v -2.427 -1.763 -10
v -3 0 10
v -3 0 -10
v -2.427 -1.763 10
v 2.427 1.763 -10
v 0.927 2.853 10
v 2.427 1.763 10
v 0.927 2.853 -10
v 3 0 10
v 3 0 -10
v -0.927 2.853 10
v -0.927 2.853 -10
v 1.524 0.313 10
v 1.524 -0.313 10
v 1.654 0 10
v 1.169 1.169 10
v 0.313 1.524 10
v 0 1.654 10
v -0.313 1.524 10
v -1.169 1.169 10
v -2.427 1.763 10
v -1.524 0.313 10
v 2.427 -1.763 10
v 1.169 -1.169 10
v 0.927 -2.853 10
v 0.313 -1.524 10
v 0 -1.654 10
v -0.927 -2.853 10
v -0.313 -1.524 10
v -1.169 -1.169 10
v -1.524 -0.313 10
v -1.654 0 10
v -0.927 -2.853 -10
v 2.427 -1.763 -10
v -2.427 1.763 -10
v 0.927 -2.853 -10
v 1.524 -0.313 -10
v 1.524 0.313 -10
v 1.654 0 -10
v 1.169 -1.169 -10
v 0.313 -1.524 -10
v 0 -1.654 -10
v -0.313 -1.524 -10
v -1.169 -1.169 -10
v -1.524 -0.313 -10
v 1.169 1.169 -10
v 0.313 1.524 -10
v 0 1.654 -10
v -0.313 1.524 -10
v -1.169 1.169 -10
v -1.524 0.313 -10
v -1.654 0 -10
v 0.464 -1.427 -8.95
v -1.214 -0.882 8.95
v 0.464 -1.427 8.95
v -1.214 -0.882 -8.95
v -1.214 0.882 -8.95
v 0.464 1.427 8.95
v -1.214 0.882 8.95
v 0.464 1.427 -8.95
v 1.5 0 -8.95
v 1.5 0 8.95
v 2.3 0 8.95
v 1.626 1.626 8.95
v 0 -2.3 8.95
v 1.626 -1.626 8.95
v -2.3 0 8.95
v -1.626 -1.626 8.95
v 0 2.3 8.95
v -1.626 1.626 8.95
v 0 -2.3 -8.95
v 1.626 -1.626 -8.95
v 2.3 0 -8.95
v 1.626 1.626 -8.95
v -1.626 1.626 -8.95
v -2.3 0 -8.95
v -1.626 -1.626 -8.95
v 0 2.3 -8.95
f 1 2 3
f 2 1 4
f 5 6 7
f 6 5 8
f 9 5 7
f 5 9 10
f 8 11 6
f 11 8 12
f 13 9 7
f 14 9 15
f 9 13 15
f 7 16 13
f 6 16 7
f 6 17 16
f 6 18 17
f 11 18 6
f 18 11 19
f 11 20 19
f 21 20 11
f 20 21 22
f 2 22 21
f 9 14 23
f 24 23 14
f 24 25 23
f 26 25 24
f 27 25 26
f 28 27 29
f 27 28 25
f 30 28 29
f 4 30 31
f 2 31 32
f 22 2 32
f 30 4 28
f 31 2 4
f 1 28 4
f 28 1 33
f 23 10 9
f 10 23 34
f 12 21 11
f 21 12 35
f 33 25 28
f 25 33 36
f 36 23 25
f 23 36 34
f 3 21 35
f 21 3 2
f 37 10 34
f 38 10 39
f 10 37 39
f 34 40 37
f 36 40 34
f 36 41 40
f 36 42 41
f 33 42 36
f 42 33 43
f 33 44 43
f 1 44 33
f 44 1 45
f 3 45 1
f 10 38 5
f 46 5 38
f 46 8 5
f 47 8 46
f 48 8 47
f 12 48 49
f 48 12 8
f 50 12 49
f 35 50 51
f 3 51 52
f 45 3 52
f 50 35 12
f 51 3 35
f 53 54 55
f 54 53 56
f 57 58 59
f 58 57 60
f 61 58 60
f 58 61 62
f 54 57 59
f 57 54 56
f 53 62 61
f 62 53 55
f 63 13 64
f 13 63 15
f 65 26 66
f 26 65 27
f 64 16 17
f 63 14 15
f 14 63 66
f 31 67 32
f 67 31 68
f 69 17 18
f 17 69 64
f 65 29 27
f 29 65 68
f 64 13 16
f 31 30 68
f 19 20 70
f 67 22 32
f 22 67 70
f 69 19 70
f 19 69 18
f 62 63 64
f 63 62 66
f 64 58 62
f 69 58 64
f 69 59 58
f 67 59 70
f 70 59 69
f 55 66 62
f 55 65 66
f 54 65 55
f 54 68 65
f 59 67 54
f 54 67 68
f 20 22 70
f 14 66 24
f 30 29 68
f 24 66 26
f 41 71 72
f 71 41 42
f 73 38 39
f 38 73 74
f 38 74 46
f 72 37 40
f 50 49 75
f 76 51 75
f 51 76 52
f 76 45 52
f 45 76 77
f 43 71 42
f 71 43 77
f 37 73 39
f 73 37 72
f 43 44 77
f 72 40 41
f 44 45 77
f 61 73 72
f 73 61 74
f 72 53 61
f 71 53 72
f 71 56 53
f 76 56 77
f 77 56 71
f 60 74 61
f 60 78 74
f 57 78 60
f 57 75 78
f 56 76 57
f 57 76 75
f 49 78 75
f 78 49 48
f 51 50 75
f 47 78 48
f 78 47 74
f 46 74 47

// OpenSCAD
// Parameters
thread_diameter_mm = 3.0; //[1.5:6.0:0.1]
length_mm = 20.0; //[10.0:40.0:0.5]
outer_diameter_mm = 6.0; //[4.0:12.0:0.5]
thread_length_top_mm = 20.0; //[0.0:20.0:0.5]
thread_length_bottom_mm = 20.0; //[0.0:20.0:0.5]
through_hole_diameter_mm = 3.0; //[1.5:6.0:0.1]
chamfer_mm = 0.8; //[0.0:2.0:0.1]
eps_mm = 0.5; //[0.2:2.0:0.1]

// Pillar - complete geometry
module pillar() {
  color("Silver") {
    // Main body
    cylinder(h=length_mm, r=outer_diameter_mm/2, center=true);
  }
}

// Standoff - complete geometry
module standoff() {
  color("DimGray") {
    difference() {
      // Main body
      pillar();
      // Through hole
      translate([0, 0, 0])
        cylinder(h=length_mm + 2*eps_mm, r=through_hole_diameter_mm/2, center=true);
      // Top chamfer
      translate([0, 0, length_mm/2 - (chamfer_mm + eps_mm)/2 + eps_mm/2])
        cylinder(h=chamfer_mm + eps_mm, r1=through_hole_diameter_mm/2 + chamfer_mm, r2=through_hole_diameter_mm/2, center=true);
      // Bottom chamfer
      translate([0, 0, -length_mm/2 + (chamfer_mm + eps_mm)/2 - eps_mm/2])
        cylinder(h=chamfer_mm + eps_mm, r1=through_hole_diameter_mm/2, r2=through_hole_diameter_mm/2 + chamfer_mm, center=true);
    }
  }
}

// Assembly
module assembly() {
  standoff();
}

assembly();
